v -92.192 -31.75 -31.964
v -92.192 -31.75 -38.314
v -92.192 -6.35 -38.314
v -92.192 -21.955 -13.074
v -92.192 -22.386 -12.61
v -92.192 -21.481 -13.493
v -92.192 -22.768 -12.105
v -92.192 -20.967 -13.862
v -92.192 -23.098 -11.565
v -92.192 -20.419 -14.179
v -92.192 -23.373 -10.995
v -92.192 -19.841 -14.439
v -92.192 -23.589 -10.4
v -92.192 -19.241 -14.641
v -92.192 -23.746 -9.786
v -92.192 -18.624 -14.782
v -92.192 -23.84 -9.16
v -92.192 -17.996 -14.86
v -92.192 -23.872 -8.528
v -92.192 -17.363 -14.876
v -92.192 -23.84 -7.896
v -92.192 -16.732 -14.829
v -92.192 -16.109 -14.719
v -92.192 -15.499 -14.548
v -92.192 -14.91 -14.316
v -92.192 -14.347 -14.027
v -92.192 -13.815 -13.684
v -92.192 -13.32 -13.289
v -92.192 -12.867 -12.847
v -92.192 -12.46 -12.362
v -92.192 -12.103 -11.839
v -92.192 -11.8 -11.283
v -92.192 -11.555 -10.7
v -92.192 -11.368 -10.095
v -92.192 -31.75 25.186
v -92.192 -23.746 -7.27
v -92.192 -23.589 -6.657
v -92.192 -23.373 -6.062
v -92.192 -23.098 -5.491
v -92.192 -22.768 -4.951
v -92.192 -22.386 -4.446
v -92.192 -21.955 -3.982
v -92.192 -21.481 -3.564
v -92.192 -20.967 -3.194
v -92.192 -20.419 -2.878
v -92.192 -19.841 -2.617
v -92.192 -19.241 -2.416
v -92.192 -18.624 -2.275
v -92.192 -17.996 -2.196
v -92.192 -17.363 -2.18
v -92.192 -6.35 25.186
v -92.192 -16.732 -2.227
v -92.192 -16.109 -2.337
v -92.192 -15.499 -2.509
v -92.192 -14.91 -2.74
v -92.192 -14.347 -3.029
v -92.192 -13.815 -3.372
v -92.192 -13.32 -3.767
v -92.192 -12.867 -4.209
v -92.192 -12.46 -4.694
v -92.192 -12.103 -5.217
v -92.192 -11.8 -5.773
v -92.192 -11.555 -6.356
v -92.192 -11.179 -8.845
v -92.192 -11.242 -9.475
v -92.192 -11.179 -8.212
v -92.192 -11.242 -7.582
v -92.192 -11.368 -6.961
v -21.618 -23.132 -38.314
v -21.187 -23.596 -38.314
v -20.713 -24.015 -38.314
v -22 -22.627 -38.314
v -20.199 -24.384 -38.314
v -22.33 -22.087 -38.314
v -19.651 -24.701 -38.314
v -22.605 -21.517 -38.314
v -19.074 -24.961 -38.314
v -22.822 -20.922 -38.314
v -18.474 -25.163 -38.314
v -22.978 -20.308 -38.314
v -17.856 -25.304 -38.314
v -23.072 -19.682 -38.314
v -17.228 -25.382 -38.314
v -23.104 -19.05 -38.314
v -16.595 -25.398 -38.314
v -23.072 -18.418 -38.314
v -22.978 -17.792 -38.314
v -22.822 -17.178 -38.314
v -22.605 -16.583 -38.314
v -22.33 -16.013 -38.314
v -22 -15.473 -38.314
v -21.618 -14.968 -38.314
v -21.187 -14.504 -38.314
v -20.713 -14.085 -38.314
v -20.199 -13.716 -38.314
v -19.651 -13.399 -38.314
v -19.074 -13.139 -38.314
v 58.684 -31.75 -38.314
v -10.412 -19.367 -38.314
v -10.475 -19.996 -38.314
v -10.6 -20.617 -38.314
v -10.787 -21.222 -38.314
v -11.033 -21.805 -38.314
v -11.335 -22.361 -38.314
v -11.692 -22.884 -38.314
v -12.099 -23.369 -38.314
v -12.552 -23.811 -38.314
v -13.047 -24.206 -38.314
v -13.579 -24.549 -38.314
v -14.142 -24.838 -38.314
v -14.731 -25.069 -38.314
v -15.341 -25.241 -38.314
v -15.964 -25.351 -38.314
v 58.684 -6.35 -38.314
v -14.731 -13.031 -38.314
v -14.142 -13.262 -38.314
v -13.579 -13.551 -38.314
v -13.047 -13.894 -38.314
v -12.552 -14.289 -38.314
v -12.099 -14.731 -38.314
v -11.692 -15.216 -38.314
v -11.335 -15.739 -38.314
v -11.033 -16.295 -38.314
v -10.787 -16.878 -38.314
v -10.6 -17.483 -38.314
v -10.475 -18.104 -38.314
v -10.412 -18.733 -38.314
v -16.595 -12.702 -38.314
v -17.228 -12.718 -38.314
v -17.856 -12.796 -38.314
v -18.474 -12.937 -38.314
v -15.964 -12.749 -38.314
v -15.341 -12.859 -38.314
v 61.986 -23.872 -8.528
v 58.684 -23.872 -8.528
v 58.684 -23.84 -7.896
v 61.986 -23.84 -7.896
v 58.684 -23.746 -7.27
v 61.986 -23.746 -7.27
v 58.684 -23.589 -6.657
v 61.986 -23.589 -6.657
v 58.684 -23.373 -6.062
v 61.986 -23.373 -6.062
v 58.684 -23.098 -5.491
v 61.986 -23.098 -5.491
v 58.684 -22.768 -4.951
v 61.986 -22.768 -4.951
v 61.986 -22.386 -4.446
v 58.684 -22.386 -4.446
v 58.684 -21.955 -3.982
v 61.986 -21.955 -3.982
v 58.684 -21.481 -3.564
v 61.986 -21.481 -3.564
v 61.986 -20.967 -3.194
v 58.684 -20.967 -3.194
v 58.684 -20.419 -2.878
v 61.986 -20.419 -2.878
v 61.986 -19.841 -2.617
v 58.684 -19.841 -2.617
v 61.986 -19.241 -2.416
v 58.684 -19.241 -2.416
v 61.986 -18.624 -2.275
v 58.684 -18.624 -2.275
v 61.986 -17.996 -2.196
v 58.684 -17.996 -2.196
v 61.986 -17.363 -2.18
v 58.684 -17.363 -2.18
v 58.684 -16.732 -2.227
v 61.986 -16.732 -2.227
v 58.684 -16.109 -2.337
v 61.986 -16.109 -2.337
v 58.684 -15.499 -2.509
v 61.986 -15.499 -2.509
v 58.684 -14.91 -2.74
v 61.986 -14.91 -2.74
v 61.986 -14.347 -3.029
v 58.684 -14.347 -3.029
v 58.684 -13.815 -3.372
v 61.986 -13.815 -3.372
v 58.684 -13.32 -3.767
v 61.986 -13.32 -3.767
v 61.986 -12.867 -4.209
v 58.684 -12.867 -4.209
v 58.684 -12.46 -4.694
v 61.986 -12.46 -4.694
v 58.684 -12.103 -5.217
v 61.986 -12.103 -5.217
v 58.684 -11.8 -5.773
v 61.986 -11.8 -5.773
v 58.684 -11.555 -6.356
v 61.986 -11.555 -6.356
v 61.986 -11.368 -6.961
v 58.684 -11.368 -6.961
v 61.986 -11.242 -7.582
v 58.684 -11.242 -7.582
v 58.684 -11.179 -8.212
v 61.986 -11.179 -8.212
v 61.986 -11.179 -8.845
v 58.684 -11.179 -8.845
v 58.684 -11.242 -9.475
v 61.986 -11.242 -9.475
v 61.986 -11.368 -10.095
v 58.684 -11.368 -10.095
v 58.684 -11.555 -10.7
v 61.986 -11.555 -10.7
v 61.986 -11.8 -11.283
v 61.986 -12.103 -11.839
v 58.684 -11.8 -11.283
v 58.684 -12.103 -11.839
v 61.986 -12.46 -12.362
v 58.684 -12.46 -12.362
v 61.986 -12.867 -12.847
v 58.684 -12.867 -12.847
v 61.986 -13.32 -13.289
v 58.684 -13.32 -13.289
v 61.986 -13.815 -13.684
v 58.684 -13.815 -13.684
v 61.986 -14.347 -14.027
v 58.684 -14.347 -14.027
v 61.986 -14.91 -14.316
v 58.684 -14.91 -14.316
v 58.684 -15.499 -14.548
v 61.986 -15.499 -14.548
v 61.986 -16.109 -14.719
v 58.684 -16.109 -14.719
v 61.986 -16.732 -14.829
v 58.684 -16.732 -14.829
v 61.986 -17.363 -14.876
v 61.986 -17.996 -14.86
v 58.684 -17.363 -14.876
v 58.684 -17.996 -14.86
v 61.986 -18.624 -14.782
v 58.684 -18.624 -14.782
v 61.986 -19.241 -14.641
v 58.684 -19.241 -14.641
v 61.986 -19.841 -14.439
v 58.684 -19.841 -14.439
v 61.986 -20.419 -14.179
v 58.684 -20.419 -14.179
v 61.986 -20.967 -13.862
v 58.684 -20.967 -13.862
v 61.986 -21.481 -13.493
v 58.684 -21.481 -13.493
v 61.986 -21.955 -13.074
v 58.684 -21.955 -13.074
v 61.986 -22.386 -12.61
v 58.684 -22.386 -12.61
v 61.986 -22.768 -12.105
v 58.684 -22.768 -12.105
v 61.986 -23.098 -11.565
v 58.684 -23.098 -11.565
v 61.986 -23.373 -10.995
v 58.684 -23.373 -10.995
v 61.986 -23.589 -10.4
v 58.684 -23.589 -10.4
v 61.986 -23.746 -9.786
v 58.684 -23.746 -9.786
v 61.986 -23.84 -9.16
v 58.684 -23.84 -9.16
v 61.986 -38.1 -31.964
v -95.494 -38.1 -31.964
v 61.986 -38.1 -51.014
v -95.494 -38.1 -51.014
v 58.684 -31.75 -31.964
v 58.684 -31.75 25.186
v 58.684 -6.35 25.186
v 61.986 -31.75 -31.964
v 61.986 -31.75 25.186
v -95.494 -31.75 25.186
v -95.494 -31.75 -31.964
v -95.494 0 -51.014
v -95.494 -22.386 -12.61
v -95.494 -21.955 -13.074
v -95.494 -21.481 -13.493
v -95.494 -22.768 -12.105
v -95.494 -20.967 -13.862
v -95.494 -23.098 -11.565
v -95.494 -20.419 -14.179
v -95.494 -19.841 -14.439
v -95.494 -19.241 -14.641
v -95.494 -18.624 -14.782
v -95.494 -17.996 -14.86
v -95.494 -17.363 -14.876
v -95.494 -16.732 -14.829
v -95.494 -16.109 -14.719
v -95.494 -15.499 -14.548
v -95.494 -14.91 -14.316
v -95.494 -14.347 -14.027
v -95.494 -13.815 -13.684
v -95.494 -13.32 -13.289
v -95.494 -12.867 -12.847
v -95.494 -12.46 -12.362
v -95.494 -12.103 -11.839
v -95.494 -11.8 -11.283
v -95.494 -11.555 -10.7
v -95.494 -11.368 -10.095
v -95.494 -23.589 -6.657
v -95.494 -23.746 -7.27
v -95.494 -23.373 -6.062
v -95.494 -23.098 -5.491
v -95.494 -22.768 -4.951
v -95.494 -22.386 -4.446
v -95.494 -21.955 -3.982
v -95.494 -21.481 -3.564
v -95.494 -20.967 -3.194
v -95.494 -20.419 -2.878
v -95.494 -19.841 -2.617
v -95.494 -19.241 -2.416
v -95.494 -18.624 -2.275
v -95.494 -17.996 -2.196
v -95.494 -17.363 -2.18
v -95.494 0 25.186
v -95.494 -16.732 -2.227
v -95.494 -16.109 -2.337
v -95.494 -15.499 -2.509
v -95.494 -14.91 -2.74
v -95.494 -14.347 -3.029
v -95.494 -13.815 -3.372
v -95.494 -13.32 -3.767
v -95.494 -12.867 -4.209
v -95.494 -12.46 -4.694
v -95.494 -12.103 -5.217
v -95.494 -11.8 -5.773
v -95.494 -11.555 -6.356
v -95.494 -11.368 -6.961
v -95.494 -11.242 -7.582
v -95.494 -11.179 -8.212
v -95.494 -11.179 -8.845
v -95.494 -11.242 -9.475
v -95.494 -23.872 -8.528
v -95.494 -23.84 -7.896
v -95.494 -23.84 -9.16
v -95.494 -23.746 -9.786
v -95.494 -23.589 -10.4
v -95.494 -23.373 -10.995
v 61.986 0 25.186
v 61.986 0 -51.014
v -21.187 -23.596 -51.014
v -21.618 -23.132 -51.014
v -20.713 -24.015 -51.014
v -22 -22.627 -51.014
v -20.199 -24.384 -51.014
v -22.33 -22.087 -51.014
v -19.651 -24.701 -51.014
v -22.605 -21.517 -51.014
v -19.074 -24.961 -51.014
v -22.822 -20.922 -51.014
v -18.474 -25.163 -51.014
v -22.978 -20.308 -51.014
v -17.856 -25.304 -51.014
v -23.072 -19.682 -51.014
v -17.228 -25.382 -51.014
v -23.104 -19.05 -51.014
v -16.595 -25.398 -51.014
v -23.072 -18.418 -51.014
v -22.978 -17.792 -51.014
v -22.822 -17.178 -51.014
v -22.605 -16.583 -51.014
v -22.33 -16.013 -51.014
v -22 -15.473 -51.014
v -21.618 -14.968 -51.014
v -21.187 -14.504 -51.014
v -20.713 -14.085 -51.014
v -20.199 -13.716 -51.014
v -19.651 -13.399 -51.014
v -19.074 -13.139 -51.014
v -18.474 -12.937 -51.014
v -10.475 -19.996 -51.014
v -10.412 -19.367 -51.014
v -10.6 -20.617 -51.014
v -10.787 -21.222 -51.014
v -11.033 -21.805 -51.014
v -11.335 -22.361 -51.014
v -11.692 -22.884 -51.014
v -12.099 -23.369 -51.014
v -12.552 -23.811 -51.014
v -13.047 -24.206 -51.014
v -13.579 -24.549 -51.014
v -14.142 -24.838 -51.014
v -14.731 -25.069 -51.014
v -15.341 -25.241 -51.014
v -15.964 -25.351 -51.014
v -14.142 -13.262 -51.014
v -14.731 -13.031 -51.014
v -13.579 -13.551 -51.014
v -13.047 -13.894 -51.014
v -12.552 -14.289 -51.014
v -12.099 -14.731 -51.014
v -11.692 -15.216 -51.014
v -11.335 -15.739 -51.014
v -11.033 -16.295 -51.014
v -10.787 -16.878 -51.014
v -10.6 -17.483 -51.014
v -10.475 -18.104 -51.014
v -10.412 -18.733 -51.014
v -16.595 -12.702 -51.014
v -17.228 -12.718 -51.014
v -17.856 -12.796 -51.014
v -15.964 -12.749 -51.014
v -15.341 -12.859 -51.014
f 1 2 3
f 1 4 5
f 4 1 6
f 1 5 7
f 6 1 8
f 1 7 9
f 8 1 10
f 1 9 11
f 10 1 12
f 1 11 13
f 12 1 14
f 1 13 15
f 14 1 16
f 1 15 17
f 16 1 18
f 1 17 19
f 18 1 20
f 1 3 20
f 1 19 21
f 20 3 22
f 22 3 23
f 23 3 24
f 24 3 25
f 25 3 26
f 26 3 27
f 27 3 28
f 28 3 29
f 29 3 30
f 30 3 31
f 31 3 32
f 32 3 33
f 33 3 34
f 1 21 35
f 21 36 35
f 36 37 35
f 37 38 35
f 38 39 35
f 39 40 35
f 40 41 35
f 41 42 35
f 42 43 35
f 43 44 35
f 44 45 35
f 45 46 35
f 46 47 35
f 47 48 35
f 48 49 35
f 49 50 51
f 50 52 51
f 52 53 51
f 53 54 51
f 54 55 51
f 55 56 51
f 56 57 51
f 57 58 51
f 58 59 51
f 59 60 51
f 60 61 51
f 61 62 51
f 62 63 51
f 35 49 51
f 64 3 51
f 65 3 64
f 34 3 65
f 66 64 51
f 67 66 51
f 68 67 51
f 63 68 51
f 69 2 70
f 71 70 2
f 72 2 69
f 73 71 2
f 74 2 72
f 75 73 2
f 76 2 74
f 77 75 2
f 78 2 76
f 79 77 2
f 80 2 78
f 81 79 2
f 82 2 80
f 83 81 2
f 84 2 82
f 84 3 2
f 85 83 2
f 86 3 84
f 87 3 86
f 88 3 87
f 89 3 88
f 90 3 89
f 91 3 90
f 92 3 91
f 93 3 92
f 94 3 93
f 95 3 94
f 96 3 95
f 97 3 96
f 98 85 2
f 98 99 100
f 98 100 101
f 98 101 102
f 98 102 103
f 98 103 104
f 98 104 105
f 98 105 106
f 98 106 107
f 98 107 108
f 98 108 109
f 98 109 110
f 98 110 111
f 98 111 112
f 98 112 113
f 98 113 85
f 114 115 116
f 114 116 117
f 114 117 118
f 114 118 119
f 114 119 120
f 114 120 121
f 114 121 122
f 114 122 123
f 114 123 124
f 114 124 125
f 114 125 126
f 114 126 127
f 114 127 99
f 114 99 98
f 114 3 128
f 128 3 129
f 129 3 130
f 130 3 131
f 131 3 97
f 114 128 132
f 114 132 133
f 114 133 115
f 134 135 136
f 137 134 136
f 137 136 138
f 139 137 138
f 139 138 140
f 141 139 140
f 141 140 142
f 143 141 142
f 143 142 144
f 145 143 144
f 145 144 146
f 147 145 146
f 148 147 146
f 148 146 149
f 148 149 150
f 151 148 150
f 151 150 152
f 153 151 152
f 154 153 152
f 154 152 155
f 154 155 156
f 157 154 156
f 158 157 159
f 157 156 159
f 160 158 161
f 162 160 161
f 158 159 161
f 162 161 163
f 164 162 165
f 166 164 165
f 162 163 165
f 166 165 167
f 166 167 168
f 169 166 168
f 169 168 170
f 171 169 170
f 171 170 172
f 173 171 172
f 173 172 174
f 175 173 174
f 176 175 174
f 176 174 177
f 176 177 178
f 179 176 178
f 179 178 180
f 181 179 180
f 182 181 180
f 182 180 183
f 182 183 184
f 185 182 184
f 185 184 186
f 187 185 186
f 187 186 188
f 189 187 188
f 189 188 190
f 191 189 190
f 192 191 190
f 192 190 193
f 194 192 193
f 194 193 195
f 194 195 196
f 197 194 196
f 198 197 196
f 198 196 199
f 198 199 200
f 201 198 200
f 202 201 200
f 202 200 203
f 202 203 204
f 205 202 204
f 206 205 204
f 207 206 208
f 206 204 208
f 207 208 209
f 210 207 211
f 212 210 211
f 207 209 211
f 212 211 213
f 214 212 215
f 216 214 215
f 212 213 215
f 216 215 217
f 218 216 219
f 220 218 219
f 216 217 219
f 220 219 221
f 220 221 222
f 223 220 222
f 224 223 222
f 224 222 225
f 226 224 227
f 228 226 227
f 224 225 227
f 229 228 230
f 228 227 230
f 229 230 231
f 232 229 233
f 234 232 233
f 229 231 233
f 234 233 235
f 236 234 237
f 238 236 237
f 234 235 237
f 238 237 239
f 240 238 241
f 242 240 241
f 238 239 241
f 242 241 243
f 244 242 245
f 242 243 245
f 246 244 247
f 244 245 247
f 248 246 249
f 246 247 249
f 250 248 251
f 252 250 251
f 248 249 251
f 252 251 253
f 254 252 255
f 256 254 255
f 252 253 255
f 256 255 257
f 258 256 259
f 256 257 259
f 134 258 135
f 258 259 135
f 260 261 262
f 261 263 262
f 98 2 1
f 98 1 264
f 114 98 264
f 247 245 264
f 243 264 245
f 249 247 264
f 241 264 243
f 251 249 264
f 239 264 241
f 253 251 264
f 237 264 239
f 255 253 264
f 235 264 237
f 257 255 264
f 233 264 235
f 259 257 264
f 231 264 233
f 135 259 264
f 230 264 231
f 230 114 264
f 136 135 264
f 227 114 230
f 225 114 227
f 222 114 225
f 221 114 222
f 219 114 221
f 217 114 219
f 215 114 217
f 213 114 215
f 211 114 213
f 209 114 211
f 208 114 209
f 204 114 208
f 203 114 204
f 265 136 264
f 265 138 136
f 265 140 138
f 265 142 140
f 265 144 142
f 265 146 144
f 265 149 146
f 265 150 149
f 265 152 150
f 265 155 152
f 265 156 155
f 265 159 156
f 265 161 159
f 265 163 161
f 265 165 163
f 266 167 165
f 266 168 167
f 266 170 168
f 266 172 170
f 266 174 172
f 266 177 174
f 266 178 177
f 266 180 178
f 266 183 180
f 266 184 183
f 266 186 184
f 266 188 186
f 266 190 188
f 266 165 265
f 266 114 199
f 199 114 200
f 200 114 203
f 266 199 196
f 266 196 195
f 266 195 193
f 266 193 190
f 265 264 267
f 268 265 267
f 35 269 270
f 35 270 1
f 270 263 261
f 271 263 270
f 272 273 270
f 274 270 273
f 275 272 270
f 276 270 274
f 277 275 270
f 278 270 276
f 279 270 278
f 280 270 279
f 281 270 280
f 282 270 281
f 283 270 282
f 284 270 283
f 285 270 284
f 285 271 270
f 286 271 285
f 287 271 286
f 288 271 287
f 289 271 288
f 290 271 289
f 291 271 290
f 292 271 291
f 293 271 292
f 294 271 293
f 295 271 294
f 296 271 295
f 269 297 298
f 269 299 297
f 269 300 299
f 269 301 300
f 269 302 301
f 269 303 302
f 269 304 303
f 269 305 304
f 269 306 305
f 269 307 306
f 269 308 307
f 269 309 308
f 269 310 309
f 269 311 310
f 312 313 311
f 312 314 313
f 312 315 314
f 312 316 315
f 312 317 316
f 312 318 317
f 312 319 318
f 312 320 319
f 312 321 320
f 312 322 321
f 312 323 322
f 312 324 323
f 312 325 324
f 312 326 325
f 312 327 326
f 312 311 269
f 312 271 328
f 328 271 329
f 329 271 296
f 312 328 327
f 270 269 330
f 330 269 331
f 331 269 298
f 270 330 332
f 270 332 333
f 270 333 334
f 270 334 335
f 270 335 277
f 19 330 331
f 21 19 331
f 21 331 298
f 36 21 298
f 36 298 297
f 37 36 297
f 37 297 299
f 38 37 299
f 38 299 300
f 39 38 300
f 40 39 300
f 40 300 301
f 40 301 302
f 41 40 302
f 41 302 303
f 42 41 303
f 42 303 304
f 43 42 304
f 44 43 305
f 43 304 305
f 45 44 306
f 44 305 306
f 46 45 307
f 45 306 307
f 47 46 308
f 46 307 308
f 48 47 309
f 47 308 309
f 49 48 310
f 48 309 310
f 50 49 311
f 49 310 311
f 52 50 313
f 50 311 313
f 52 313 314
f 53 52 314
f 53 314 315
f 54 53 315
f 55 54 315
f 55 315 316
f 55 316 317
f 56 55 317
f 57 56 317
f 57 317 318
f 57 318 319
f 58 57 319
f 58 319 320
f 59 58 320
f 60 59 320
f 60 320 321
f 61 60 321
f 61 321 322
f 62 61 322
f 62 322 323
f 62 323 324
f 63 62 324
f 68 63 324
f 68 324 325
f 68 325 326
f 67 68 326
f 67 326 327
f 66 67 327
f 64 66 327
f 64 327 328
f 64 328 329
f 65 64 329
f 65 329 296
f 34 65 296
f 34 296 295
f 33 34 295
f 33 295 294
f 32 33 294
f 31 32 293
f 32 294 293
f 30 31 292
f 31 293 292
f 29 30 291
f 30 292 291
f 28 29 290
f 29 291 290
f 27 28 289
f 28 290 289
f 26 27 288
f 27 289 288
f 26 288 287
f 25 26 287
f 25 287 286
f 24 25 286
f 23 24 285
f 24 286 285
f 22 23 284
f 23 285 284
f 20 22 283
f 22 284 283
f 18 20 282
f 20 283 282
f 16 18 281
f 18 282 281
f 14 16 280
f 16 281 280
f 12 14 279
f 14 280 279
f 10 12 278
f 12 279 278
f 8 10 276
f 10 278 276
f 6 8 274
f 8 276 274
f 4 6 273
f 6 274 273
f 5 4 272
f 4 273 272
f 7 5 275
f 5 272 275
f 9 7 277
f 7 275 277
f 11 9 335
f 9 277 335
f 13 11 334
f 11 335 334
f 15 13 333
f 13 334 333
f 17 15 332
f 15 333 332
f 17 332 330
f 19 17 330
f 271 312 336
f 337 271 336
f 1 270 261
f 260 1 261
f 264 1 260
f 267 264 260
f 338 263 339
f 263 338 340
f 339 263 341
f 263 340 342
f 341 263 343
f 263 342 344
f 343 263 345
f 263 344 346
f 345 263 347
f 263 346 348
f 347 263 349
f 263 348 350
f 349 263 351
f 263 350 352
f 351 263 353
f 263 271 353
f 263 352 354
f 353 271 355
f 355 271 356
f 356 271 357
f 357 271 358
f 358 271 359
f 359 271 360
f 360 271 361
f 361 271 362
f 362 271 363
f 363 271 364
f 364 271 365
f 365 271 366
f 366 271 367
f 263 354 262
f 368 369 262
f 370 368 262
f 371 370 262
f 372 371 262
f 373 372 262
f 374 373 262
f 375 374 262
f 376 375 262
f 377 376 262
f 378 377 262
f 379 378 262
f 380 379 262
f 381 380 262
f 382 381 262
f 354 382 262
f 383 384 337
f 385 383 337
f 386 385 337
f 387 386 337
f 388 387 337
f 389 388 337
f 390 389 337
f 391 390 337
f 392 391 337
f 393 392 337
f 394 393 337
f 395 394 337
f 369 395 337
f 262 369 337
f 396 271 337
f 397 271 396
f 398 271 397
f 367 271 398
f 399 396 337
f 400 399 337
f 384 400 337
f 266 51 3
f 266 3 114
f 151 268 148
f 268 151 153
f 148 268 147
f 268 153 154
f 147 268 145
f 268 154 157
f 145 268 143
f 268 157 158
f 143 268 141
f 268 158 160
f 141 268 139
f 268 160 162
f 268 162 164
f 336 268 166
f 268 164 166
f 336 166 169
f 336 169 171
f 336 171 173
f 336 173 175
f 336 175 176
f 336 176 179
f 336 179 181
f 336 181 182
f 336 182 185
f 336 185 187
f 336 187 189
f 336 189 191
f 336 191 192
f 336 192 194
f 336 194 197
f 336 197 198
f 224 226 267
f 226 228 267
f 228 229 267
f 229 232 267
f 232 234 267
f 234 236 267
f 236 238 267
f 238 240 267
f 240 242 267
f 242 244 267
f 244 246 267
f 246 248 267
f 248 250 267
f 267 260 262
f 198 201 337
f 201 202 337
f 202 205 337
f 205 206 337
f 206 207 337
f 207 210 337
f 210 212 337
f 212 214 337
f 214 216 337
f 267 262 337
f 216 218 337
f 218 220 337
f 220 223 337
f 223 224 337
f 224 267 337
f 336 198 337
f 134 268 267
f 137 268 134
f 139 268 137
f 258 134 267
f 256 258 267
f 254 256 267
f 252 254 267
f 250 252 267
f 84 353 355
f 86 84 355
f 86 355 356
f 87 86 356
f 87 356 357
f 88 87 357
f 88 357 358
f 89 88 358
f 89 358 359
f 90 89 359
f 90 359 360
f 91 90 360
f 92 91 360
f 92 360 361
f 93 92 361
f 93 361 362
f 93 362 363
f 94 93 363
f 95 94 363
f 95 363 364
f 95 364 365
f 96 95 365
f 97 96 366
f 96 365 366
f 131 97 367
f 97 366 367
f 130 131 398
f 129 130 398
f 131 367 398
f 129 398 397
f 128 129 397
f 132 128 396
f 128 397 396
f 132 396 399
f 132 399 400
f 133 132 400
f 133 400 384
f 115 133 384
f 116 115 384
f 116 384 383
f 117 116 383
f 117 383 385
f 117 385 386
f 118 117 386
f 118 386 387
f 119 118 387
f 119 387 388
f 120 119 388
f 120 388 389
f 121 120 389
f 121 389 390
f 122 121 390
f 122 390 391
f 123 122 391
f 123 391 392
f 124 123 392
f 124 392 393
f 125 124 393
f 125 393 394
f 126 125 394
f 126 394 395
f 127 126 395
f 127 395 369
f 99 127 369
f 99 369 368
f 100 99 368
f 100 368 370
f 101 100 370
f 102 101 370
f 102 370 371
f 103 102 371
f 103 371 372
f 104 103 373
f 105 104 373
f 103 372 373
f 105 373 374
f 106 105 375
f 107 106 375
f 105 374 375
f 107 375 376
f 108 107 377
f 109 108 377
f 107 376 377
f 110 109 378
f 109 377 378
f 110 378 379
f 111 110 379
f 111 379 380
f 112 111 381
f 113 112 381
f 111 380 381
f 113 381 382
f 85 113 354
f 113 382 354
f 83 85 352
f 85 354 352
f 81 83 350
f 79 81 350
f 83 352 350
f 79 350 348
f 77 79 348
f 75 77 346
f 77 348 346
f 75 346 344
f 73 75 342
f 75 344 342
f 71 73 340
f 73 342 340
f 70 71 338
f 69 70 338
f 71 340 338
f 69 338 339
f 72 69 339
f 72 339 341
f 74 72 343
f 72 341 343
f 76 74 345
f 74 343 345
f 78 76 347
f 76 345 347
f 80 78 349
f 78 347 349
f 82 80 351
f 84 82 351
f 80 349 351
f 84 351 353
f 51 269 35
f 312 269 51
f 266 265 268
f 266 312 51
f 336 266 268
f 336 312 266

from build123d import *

# Parameters (mm, degrees)
F0_W     = 157.48
F0_H     = 76.2
F1_DEPTH = 6.35
F2_W     = 157.48
F2_H     = 12.7
F3_DEPTH = 31.75
F4_W     = 157.48
F4_H     = 6.35
F5_DEPTH = 6.35
F7_D     = 12.7
F8_W     = 3.302
F8_H     = 63.5
F9_DEPTH = 25.4
F11_D    = 12.7


with BuildPart() as f1:
    # F0 (on Front) → F1 (new body)
    with BuildSketch(Plane.XZ):
        with Locations((-16.753665, -12.914129)):
            Rectangle(F0_W, F0_H)
    extrude(amount=F1_DEPTH)

    # F2 (on face) → F3 (join)
    with BuildSketch(Plane.XZ.offset(6.35)):
        with Locations((-16.753665, -44.664129)):
            Rectangle(F2_W, F2_H)
    extrude(amount=F3_DEPTH)

    # F4 (on face) → F5 (join)
    with BuildSketch(Plane.XY.offset(-38.314129)):
        with Locations((-16.753665, -34.925)):
            Rectangle(F4_W, F4_H)
    extrude(amount=F5_DEPTH)

    # F7 (through all)
    with Locations(Plane.XY.offset(-38.314129)):
        with Locations((-16.753665, -19.05)):
            Hole(F7_D / 2)

    # F8 (on face) → F9 (join)
    with BuildSketch(Plane.XZ.offset(6.35)):
        with Locations((-93.842665, -6.564129)):
            Rectangle(F8_W, F8_H)
        with Locations((60.335335, -6.564129)):
            Rectangle(F8_W, F8_H)
    extrude(amount=F9_DEPTH)

    # F11 (through all)
    with Locations(Plane.YZ.offset(61.986335)):
        with Locations((-17.52157, -8.528198)):
            Hole(F11_D / 2)


solid = f1.part
